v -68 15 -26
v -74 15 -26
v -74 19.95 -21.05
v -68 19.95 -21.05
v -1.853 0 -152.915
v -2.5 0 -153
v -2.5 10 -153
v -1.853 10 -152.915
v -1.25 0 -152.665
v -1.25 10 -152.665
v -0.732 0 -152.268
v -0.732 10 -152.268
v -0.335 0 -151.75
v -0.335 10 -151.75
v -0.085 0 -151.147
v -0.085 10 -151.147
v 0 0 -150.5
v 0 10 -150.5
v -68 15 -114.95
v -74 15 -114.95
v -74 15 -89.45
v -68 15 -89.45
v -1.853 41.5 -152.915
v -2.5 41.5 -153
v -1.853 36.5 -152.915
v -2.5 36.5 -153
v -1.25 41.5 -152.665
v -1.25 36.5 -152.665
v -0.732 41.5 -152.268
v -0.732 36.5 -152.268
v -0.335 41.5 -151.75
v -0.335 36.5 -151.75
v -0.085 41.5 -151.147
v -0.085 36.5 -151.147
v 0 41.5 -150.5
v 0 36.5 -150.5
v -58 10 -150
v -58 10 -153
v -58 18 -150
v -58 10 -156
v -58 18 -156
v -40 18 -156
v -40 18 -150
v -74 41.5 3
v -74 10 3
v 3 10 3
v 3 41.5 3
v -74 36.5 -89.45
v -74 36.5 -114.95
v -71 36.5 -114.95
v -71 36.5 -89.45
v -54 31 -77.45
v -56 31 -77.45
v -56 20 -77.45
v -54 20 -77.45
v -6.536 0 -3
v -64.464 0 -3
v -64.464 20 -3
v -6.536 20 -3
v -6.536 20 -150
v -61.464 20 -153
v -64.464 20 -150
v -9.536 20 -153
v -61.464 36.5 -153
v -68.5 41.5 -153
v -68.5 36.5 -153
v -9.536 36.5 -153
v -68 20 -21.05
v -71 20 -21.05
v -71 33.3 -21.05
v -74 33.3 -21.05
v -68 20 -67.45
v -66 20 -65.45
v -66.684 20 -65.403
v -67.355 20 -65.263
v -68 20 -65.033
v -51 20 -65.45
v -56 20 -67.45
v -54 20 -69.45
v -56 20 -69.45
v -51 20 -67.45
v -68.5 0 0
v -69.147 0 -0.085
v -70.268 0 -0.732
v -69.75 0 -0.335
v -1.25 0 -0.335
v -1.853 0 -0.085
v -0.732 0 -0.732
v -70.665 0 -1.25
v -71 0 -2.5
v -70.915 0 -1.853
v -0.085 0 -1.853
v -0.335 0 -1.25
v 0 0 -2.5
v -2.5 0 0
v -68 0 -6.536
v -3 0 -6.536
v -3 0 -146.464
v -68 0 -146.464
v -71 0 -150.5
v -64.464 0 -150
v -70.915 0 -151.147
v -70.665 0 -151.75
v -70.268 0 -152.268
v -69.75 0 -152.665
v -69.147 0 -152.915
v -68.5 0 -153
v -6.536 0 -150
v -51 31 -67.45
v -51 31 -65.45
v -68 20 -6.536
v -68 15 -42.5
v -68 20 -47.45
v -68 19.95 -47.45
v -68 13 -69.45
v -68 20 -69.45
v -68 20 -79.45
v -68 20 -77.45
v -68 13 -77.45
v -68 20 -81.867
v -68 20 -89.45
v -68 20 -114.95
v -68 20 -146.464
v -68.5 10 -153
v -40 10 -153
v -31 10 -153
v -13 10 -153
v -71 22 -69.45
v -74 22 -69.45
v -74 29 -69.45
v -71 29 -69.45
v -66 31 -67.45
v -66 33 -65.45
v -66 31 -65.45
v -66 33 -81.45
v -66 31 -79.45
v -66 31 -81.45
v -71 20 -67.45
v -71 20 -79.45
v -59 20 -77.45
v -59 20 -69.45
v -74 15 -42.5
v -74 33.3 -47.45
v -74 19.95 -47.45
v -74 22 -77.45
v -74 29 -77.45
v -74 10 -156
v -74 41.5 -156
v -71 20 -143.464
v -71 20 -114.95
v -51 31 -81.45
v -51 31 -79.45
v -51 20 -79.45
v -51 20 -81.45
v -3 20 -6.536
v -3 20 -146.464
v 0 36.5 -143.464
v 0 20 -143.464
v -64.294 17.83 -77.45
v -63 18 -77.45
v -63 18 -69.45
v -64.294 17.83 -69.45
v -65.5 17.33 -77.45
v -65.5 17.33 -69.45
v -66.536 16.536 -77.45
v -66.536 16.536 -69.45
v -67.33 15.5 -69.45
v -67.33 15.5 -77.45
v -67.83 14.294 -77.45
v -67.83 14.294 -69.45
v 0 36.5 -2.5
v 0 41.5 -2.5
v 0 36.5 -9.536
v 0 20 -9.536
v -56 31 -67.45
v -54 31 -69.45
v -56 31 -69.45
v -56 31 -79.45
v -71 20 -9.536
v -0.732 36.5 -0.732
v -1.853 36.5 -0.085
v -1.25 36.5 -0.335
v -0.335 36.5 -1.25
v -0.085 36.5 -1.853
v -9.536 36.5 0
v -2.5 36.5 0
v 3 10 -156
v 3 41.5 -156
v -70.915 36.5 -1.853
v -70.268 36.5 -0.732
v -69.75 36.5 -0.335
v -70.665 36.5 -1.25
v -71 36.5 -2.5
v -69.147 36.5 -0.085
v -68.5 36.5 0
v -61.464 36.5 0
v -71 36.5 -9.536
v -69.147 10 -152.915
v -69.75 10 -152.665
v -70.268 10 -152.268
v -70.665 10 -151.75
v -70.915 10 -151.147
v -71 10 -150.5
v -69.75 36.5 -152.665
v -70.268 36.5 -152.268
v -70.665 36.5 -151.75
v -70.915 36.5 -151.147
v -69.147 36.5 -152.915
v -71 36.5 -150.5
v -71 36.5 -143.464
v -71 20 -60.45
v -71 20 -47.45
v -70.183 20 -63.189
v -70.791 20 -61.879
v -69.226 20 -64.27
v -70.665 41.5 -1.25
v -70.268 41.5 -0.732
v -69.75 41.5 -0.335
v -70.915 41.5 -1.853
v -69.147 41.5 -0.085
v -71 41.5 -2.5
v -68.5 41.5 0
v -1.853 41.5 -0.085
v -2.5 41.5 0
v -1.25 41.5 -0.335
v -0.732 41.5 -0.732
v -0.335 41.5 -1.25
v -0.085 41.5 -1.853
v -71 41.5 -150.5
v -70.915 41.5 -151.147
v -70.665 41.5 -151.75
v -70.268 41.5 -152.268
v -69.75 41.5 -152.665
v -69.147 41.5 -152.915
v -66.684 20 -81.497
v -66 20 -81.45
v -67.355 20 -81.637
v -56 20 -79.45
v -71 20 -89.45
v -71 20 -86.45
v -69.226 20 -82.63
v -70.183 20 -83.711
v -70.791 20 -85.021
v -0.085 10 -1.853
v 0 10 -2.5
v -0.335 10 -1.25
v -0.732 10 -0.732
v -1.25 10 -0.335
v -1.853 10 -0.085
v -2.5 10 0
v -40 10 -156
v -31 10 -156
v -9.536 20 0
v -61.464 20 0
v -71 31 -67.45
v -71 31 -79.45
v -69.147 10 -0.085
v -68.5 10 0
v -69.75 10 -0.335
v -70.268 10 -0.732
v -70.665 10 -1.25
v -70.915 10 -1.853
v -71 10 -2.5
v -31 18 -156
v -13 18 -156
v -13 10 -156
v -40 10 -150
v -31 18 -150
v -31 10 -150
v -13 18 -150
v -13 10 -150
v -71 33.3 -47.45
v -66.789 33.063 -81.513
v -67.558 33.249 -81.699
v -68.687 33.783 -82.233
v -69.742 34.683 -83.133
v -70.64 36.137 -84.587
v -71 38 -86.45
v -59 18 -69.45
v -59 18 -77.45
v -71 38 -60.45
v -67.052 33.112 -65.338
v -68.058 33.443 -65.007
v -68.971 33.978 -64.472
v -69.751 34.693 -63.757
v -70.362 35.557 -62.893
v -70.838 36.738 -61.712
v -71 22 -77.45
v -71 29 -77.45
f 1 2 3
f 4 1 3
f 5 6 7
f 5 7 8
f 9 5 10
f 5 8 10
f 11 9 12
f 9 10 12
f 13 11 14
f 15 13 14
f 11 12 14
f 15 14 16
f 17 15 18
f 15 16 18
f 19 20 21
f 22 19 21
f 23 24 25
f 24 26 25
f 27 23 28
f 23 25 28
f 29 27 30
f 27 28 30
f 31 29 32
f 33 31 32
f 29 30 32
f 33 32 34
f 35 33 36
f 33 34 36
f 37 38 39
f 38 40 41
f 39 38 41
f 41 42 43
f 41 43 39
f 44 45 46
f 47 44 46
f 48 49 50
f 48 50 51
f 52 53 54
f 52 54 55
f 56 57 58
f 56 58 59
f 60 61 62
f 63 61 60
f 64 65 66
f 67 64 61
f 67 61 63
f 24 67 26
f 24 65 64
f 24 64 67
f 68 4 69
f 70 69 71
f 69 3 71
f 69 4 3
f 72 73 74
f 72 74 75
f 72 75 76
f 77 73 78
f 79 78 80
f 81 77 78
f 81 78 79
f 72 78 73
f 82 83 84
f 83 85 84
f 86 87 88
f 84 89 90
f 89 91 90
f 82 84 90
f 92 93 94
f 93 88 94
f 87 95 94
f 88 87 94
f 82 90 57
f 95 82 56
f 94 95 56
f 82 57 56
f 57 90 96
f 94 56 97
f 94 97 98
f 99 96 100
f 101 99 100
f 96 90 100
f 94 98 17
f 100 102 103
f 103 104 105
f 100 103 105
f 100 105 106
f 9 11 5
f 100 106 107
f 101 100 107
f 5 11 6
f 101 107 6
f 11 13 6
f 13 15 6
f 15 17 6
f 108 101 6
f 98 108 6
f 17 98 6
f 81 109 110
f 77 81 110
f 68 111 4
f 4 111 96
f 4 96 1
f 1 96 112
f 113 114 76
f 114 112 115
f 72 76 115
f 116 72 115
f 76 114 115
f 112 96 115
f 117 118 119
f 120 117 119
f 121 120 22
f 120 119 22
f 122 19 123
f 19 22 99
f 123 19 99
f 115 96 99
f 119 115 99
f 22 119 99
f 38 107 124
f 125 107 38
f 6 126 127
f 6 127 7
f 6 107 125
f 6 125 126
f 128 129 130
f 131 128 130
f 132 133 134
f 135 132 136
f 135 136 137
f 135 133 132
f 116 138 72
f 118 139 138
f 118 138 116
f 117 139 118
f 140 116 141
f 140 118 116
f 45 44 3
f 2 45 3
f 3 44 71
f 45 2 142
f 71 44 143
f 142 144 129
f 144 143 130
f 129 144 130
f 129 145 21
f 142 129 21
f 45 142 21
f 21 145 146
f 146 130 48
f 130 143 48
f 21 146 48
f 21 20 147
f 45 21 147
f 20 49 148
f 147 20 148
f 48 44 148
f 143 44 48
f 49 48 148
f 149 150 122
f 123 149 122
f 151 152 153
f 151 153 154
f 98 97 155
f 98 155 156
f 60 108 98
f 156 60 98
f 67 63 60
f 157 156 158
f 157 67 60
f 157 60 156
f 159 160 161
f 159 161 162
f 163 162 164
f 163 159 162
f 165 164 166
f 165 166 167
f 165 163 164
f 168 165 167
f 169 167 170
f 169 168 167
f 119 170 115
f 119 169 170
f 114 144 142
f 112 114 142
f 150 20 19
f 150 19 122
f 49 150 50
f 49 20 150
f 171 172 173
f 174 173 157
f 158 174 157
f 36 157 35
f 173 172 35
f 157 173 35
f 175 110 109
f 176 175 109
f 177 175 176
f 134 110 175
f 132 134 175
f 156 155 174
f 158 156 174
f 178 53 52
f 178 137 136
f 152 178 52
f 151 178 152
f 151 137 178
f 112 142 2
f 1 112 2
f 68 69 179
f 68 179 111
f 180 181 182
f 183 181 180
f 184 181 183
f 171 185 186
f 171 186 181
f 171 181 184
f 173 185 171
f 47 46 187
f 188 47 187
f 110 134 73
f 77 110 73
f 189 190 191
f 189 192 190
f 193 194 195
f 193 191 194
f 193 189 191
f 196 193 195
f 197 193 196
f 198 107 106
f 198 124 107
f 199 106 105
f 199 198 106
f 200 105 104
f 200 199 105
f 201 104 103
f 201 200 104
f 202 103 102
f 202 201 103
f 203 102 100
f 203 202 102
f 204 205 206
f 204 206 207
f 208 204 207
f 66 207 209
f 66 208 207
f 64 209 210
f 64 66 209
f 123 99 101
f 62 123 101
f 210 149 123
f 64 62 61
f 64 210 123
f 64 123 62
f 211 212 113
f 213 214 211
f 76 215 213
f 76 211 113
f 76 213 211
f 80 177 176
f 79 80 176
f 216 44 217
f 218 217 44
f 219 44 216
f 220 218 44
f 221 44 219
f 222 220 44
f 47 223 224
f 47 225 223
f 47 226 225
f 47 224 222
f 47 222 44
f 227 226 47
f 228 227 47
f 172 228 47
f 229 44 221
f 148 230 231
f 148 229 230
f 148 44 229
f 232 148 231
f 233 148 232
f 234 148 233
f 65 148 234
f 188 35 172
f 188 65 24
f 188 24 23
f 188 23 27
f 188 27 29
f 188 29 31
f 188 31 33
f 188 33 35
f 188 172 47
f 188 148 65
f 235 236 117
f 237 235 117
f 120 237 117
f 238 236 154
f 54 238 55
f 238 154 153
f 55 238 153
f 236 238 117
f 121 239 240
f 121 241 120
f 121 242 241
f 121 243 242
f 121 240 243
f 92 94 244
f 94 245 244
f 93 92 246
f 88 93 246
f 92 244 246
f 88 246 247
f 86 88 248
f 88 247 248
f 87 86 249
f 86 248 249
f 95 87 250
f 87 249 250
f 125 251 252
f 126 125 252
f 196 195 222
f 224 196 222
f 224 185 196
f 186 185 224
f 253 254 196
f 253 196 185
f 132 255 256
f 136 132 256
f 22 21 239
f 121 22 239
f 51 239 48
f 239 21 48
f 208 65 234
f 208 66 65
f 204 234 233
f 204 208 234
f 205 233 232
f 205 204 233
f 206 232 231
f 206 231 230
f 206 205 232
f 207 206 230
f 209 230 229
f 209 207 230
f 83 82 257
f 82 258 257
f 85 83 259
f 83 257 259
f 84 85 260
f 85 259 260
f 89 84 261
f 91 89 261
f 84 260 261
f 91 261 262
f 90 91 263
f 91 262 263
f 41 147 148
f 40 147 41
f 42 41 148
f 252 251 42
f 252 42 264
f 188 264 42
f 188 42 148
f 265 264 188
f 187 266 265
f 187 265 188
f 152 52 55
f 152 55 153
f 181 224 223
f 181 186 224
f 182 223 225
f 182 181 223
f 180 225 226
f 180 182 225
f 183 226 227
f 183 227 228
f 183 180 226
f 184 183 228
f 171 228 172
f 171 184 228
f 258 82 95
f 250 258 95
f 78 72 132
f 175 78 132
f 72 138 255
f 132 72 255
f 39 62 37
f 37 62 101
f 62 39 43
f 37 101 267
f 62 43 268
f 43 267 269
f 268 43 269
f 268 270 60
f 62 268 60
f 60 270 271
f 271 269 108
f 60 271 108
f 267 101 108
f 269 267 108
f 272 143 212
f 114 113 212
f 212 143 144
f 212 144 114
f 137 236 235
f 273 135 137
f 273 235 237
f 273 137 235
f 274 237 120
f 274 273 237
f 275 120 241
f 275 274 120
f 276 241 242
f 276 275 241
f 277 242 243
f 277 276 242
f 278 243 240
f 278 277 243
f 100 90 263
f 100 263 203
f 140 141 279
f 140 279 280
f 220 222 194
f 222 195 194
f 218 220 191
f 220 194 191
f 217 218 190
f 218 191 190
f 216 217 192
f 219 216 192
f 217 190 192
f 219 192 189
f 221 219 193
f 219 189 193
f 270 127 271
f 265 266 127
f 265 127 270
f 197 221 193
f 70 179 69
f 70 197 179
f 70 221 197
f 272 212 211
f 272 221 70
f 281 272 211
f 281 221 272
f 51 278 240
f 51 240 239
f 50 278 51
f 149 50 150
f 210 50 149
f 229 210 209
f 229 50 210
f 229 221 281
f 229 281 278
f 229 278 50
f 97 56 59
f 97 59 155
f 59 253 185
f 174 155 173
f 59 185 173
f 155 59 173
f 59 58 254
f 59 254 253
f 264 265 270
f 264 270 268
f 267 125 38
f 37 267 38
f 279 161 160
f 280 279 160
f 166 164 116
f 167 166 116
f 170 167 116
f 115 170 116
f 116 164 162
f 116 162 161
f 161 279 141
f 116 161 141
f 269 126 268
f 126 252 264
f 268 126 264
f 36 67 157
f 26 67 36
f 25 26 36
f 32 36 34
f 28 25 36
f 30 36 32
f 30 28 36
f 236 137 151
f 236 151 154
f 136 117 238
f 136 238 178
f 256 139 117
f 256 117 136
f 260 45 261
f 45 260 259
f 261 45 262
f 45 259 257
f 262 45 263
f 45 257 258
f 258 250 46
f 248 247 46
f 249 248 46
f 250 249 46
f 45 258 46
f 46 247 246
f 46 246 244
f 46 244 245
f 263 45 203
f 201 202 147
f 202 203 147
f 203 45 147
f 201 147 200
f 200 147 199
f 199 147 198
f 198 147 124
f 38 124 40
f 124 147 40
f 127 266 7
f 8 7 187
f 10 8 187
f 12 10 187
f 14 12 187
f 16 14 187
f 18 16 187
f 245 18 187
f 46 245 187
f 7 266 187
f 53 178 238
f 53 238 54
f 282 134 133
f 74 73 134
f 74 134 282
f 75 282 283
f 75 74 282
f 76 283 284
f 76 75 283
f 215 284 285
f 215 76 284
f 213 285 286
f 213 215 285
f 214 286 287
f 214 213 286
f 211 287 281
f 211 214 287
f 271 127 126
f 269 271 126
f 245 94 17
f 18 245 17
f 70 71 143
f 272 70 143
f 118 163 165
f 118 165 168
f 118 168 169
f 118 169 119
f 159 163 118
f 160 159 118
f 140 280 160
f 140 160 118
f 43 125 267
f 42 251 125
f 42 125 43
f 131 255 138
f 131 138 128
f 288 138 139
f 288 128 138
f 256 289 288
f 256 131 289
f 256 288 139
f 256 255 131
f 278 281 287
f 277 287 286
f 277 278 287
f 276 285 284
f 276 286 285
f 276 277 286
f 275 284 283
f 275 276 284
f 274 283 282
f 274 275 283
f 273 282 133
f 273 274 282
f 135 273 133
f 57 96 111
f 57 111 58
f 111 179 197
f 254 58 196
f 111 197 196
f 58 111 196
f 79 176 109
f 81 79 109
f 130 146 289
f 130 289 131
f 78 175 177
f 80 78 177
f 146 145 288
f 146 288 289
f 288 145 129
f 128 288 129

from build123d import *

# Parameters (mm, degrees)
SKETCH1_W           = 71
SKETCH1_H           = 153
SKETCH1_W_2         = 65
SKETCH1_H_2         = 147
BOSS_EXTRUDE1_DEPTH = 10
SKETCH2_W           = 77
SKETCH2_H           = 159
SKETCH2_W_2         = 71
SKETCH2_H_2         = 153
BOSS_EXTRUDE2_DEPTH = 60
SKETCH3_W           = 71
SKETCH3_H           = 153
SKETCH3_W_2         = 65
SKETCH3_H_2         = 147
BOSS_EXTRUDE3_DEPTH = 10
RIB17_REACH         = 188.312
SKETCH7_WALL_W      = 379.62313401
SKETCH7_WALL_H      = 60
RIB22_REACH         = 188.312
SKETCH9_WALL_W      = 379.62313401
SKETCH9_WALL_H      = 60
RIB23_REACH         = 188.312
SKETCH10_WALL_W     = 379.62313401
SKETCH10_WALL_H     = 60
RIB24_REACH         = 188.312
SKETCH11_WALL_W     = 379.62313401
SKETCH11_WALL_H     = 60
FILLET1_R           = 2.5
FILLET2_R           = 3
SKETCH12_W          = 18
SKETCH12_H          = 8
CUT_EXTRUDE1_DEPTH  = 10
SKETCH13_W          = 12
SKETCH13_H          = 11
SKETCH13_W_2        = 25.5
SKETCH13_H_2        = 21.5
CUT_EXTRUDE2_DEPTH  = 10
SKETCH14_W          = 77
SKETCH14_H          = 159
CUT_EXTRUDE3_DEPTH  = 28.5
SKETCH15_W          = 71
SKETCH15_H          = 153
CUT_EXTRUDE4_DEPTH  = 5
FILLET3_R           = 2.5
SKETCH16_W          = 2
SKETCH16_H          = 11
BOSS_EXTRUDE4_DEPTH = 17
BOSS_EXTRUDE5_DEPTH = 11
SKETCH19_W          = 8
SKETCH19_H          = 2
BOSS_EXTRUDE7_DEPTH = 9
SKETCH20_W          = 8
SKETCH20_H          = 7
BOSS_EXTRUDE8_DEPTH = 3
SKETCH21_W          = 16
SKETCH21_H          = 2
BOSS_EXTRUDE9_DEPTH = 5
FILLET4_R           = 5


with BuildPart() as part:
    # Sketch1 → Boss-Extrude1 (new body)
    with BuildSketch(Plane(origin=(0, 0, 0), x_dir=(1, 0, 0), z_dir=(0, 1, 0))):
        with Locations((-35.5, 76.5)):
            Rectangle(SKETCH1_W, SKETCH1_H)
        with Locations((-35.5, 76.5)):
            Rectangle(SKETCH1_W_2, SKETCH1_H_2, mode=Mode.SUBTRACT)
    extrude(amount=BOSS_EXTRUDE1_DEPTH)



with BuildPart() as body_2:
    # Sketch2 → Boss-Extrude2 (new body)
    with BuildSketch(Plane(origin=(0, 10, 0), x_dir=(1, 0, 0), z_dir=(0, 1, 0))):
        with Locations((-35.5, 76.5)):
            Rectangle(SKETCH2_W, SKETCH2_H)
        with Locations((-35.5, 76.5)):
            Rectangle(SKETCH2_W_2, SKETCH2_H_2, mode=Mode.SUBTRACT)
    extrude(amount=BOSS_EXTRUDE2_DEPTH)


with BuildPart() as part_1:
    add(part.part)

    add(body_2.part)  # Boss-Extrude3 merges body 2
    # Sketch3 → Boss-Extrude3 (add)
    with BuildSketch(Plane(origin=(0, 10, 0), x_dir=(1, 0, 0), z_dir=(0, 1, 0))):
        with Locations((-35.5, 76.5)):
            Rectangle(SKETCH3_W, SKETCH3_H)
        with Locations((-35.5, 76.5)):
            Rectangle(SKETCH3_W_2, SKETCH3_H_2, mode=Mode.SUBTRACT)
    extrude(amount=BOSS_EXTRUDE3_DEPTH)

    # Sketch7 wall → Rib17 (add, up to next)
    with BuildSketch(Plane(origin=(-66.232233047, 0, -4.767766953), x_dir=(0.707106781187, 0, 0.707106781187), z_dir=(-0.707106781187, 0, 0.707106781187)), mode=Mode.PRIVATE) as rib17_sk1:
        with Locations((0, 30)):
            Rectangle(SKETCH7_WALL_W, SKETCH7_WALL_H)
    rib17_tool1 = extrude(rib17_sk1.sketch, amount=RIB17_REACH, mode=Mode.PRIVATE) - part_1.part
    add(rib17_tool1.solids().sort_by_distance((-66.232233047, 0, -4.767766953))[0])

    # Sketch9 wall → Rib22 (add, up to next)
    with BuildSketch(Plane(origin=(-66.232233047, 0, -148.232233047), x_dir=(0.707106781187, 0, -0.707106781187), z_dir=(0.707106781187, 0, 0.707106781187)), mode=Mode.PRIVATE) as rib22_sk1:
        with Locations((0, 30)):
            Rectangle(SKETCH9_WALL_W, SKETCH9_WALL_H)
    rib22_tool1 = extrude(rib22_sk1.sketch, amount=-RIB22_REACH, mode=Mode.PRIVATE) - part_1.part
    add(rib22_tool1.solids().sort_by_distance((-66.232233047, 0, -148.232233047))[0])

    # Sketch10 wall → Rib23 (add, up to next)
    with BuildSketch(Plane(origin=(-4.767766953, 0, -148.232233047), x_dir=(0.707106781187, 0, 0.707106781187), z_dir=(-0.707106781187, 0, 0.707106781187)), mode=Mode.PRIVATE) as rib23_sk1:
        with Locations((0, 30)):
            Rectangle(SKETCH10_WALL_W, SKETCH10_WALL_H)
    rib23_tool1 = extrude(rib23_sk1.sketch, amount=-RIB23_REACH, mode=Mode.PRIVATE) - part_1.part
    add(rib23_tool1.solids().sort_by_distance((-4.767766953, 0, -148.232233047))[0])

    # Sketch11 wall → Rib24 (add, up to next)
    with BuildSketch(Plane(origin=(-4.767766953, 0, -4.767766953), x_dir=(0.707106781187, 0, -0.707106781187), z_dir=(0.707106781187, 0, 0.707106781187)), mode=Mode.PRIVATE) as rib24_sk1:
        with Locations((0, 30)):
            Rectangle(SKETCH11_WALL_W, SKETCH11_WALL_H)
    rib24_tool1 = extrude(rib24_sk1.sketch, amount=RIB24_REACH, mode=Mode.PRIVATE) - part_1.part
    add(rib24_tool1.solids().sort_by_distance((-4.767766953, 0, -4.767766953))[0])

    # Fillet1
    fillet1_edges = [part_1.edges().sort_by_distance(p)[0] for p in [
        (0, 5, 0),
        (-71, 5, 0),
        (-71, 5, -153),
        (0, 5, -153),
    ]]
    fillet(fillet1_edges, radius=FILLET1_R)

    # Fillet2
    fillet2_edges = [part_1.edges().sort_by_distance(p)[0] for p in [
        (-71, 65, 0),
        (0, 65, 0),
        (0, 65, -153),
        (-71, 65, -153),
    ]]
    fillet(fillet2_edges, radius=FILLET2_R)

    # Sketch12 → Cut-Extrude1 (cut)
    with BuildSketch(Plane(origin=(0, 0, -156), x_dir=(-1, 0, 0), z_dir=(0, 0, -1))):
        with Locations((22, 14)):
            Rectangle(SKETCH12_W, SKETCH12_H)
        with Locations((49, 14)):
            Rectangle(SKETCH12_W, SKETCH12_H)
    extrude(amount=-CUT_EXTRUDE1_DEPTH, mode=Mode.SUBTRACT)

    # Sketch13 → Cut-Extrude2 (cut)
    with BuildSketch(Plane.ZY.offset(74)):
        Polygon((-47.45, 19.949747468), (-42.500252532, 15), (-25.999747468, 15), (-21.05, 19.949747468), (-21.05, 33.3), (-47.45, 33.3), align=None)
        with Locations((-73.45, 25.5)):
            Rectangle(SKETCH13_W, SKETCH13_H)
        with Locations((-102.2, 25.75)):
            Rectangle(SKETCH13_W_2, SKETCH13_H_2)
    extrude(amount=-CUT_EXTRUDE2_DEPTH, mode=Mode.SUBTRACT)

    # Sketch14 → Cut-Extrude3 (cut)
    with BuildSketch(Plane(origin=(0, 70, 0), x_dir=(1, 0, 0), z_dir=(0, 1, 0))):
        with Locations((-35.5, 76.5)):
            Rectangle(SKETCH14_W, SKETCH14_H)
    extrude(amount=-CUT_EXTRUDE3_DEPTH, mode=Mode.SUBTRACT)

    # Sketch15 → Cut-Extrude4 (cut)
    with BuildSketch(Plane(origin=(0, 41.5, 0), x_dir=(1, 0, 0), z_dir=(0, 1, 0))):
        with Locations((-35.5, 76.5)):
            Rectangle(SKETCH15_W, SKETCH15_H)
    extrude(amount=-CUT_EXTRUDE4_DEPTH, mode=Mode.SUBTRACT)

    # Fillet3
    fillet3_edges = [part_1.edges().sort_by_distance(p)[0] for p in [
        (-71, 39, 0),
        (-71, 39, -153),
        (0, 39, -153),
        (0, 39, 0),
    ]]
    fillet(fillet3_edges, radius=FILLET3_R)

    # Sketch16 → Boss-Extrude4 (add)
    with BuildSketch(Plane(origin=(-71, 0, 0), x_dir=(0, 0, -1), z_dir=(1, 0, 0))):
        with Locations((66.45, 25.5)):
            Rectangle(SKETCH16_W, SKETCH16_H)
        with Locations((80.45, 25.5)):
            Rectangle(SKETCH16_W, SKETCH16_H)
    extrude(amount=BOSS_EXTRUDE4_DEPTH)

    # Sketch17 → Boss-Extrude5 (add)
    with BuildSketch(Plane(origin=(0, 31, 0), x_dir=(1, 0, 0), z_dir=(0, 1, 0))):
        Polygon((-54, 79.45), (-56, 79.45), (-56, 77.45), (-54, 77.45), (-51, 79.45), (-51, 81.45), (-54, 81.45), align=None)
        Polygon((-56, 67.45), (-56, 69.45), (-54, 69.45), (-51, 67.45), (-51, 65.45), (-54, 65.45), (-54, 67.45), align=None)
    extrude(amount=-BOSS_EXTRUDE5_DEPTH)

    # Sketch19 → Boss-Extrude7 (add)
    with BuildSketch(Plane(origin=(-68, 0, 0), x_dir=(0, 0, -1), z_dir=(1, 0, 0))):
        with Locations((73.45, 19)):
            Rectangle(SKETCH19_W, SKETCH19_H)
    extrude(amount=BOSS_EXTRUDE7_DEPTH)

    # Sketch20 → Boss-Extrude8 (add)
    with BuildSketch(Plane.ZY.offset(74)):
        Polygon((-79.45, 31), (-77.45, 31), (-69.45, 31), (-67.45, 31), (-67.45, 20), (-69.45, 20), (-77.45, 20), (-79.45, 20), align=None)
        with Locations((-73.45, 25.5)):
            Rectangle(SKETCH20_W, SKETCH20_H, mode=Mode.SUBTRACT)
    extrude(amount=-BOSS_EXTRUDE8_DEPTH)

    # Sketch21 → Boss-Extrude9 (add)
    with BuildSketch(Plane(origin=(-71, 0, 0), x_dir=(0, 0, -1), z_dir=(1, 0, 0))):
        with Locations((73.45, 32)):
            Rectangle(SKETCH21_W, SKETCH21_H)
    extrude(amount=BOSS_EXTRUDE9_DEPTH)

    # Fillet4
    # the kernel refuses this fillet: 5 mm, written as the material it adds along each edge
    with BuildSketch(Plane(origin=(-68, 18, -77.45), x_dir=(0, -1, 0), z_dir=(0, 0, 1))) as fillet4_piece_1:
        with BuildLine():
            CenterArc((FILLET4_R, FILLET4_R), FILLET4_R, 180, 90)
            Line((0, FILLET4_R), (-FILLET4_R * 0.02, FILLET4_R))
            Line((-FILLET4_R * 0.02, FILLET4_R), (-FILLET4_R * 0.02, -FILLET4_R * 0.02))
            Line((-FILLET4_R * 0.02, -FILLET4_R * 0.02), (FILLET4_R, -FILLET4_R * 0.02))
            Line((FILLET4_R, -FILLET4_R * 0.02), (FILLET4_R, 0))
        make_face()
    extrude(amount=8)
    with BuildSketch(Plane(origin=(-71, 33, -81.45), x_dir=(0, 1, 0), z_dir=(0, 0, 1))) as fillet4_piece_2:
        with BuildLine():
            CenterArc((FILLET4_R, -FILLET4_R), FILLET4_R, 90, 90)
            Line((0, -FILLET4_R), (-FILLET4_R * 0.02, -FILLET4_R))
            Line((-FILLET4_R * 0.02, -FILLET4_R), (-FILLET4_R * 0.02, FILLET4_R * 0.02))
            Line((-FILLET4_R * 0.02, FILLET4_R * 0.02), (FILLET4_R, FILLET4_R * 0.02))
            Line((FILLET4_R, FILLET4_R * 0.02), (FILLET4_R, 0))
        make_face()
    extrude(amount=16)
    with BuildSketch(Plane(origin=(-71, 33, -81.45), x_dir=(0, 0, -1), z_dir=(0, -1, 0)), Plane(origin=(-71, 20, -65.45), x_dir=(0, 0, 1), z_dir=(0, 1, 0))) as fillet4_piece_3:
        with BuildLine():
            CenterArc((FILLET4_R, FILLET4_R), FILLET4_R, 180, 90)
            Line((0, FILLET4_R), (-FILLET4_R * 0.02, FILLET4_R))
            Line((-FILLET4_R * 0.02, FILLET4_R), (-FILLET4_R * 0.02, -FILLET4_R * 0.02))
            Line((-FILLET4_R * 0.02, -FILLET4_R * 0.02), (FILLET4_R, -FILLET4_R * 0.02))
            Line((FILLET4_R, -FILLET4_R * 0.02), (FILLET4_R, 0))
        make_face()
    extrude(amount=13)
    with BuildSketch(Plane(origin=(-71, 45.5, -81.45), x_dir=(0, 0, -1), z_dir=(0, -1, 0))) as fillet4_piece_4a_section:
        with BuildLine():
            CenterArc((FILLET4_R, FILLET4_R), FILLET4_R, 180, 90)
            Line((0, FILLET4_R), (-FILLET4_R * 0.02, FILLET4_R))
            Line((-FILLET4_R * 0.02, FILLET4_R), (-FILLET4_R * 0.02, -FILLET4_R * 0.02))
            Line((-FILLET4_R * 0.02, -FILLET4_R * 0.02), (FILLET4_R, -FILLET4_R * 0.02))
            Line((FILLET4_R, -FILLET4_R * 0.02), (FILLET4_R, 0))
        make_face()
    fillet4_piece_4a = extrude(amount=25.5, mode=Mode.PRIVATE)
    fillet4_piece_4a = split(fillet4_piece_4a, bisect_by=Plane(origin=(-69.868024429, 33, -82.581975571), z_dir=(0, 1, 0)), keep=Keep.TOP, mode=Mode.PRIVATE)
    with BuildSketch(Plane(origin=(-71, 33, -93.95), x_dir=(0, 1, 0), z_dir=(0, 0, 1))) as fillet4_piece_4b_section:
        with BuildLine():
            CenterArc((FILLET4_R, -FILLET4_R), FILLET4_R, 90, 90)
            Line((0, -FILLET4_R), (-FILLET4_R * 0.02, -FILLET4_R))
            Line((-FILLET4_R * 0.02, -FILLET4_R), (-FILLET4_R * 0.02, FILLET4_R * 0.02))
            Line((-FILLET4_R * 0.02, FILLET4_R * 0.02), (FILLET4_R, FILLET4_R * 0.02))
            Line((FILLET4_R, FILLET4_R * 0.02), (FILLET4_R, 0))
        make_face()
    fillet4_piece_4b = extrude(amount=28.5, mode=Mode.PRIVATE)
    fillet4_piece_4b = split(fillet4_piece_4b, bisect_by=Plane(origin=(-69.868024429, 34.131975571, -81.45), z_dir=(0, 0, -1)), keep=Keep.TOP, mode=Mode.PRIVATE)
    fillet4_piece_4 = fillet4_piece_4a & fillet4_piece_4b
    add(fillet4_piece_4)
    with BuildSketch(Plane(origin=(-71, 33, -81.45), x_dir=(0, 1, 0), z_dir=(0, 0, 1))) as fillet4_piece_5a_section:
        with BuildLine():
            CenterArc((FILLET4_R, -FILLET4_R), FILLET4_R, 90, 90)
            Line((0, -FILLET4_R), (-FILLET4_R * 0.02, -FILLET4_R))
            Line((-FILLET4_R * 0.02, -FILLET4_R), (-FILLET4_R * 0.02, FILLET4_R * 0.02))
            Line((-FILLET4_R * 0.02, FILLET4_R * 0.02), (FILLET4_R, FILLET4_R * 0.02))
            Line((FILLET4_R, FILLET4_R * 0.02), (FILLET4_R, 0))
        make_face()
    fillet4_piece_5a = extrude(amount=28.5, mode=Mode.PRIVATE)
    fillet4_piece_5a = split(fillet4_piece_5a, bisect_by=Plane(origin=(-69.868024429, 34.131975571, -65.45), z_dir=(0, 0, 1)), keep=Keep.TOP, mode=Mode.PRIVATE)
    with BuildSketch(Plane(origin=(-71, 20, -65.45), x_dir=(0, 0, 1), z_dir=(0, 1, 0))) as fillet4_piece_5b_section:
        with BuildLine():
            CenterArc((FILLET4_R, FILLET4_R), FILLET4_R, 180, 90)
            Line((0, FILLET4_R), (-FILLET4_R * 0.02, FILLET4_R))
            Line((-FILLET4_R * 0.02, FILLET4_R), (-FILLET4_R * 0.02, -FILLET4_R * 0.02))
            Line((-FILLET4_R * 0.02, -FILLET4_R * 0.02), (FILLET4_R, -FILLET4_R * 0.02))
            Line((FILLET4_R, -FILLET4_R * 0.02), (FILLET4_R, 0))
        make_face()
    fillet4_piece_5b = extrude(amount=25.5, mode=Mode.PRIVATE)
    fillet4_piece_5b = split(fillet4_piece_5b, bisect_by=Plane(origin=(-69.868024429, 33, -64.318024429), z_dir=(0, 1, 0)), keep=Keep.TOP, mode=Mode.PRIVATE)
    fillet4_piece_5 = fillet4_piece_5a & fillet4_piece_5b
    add(fillet4_piece_5)


solid = part_1.part
